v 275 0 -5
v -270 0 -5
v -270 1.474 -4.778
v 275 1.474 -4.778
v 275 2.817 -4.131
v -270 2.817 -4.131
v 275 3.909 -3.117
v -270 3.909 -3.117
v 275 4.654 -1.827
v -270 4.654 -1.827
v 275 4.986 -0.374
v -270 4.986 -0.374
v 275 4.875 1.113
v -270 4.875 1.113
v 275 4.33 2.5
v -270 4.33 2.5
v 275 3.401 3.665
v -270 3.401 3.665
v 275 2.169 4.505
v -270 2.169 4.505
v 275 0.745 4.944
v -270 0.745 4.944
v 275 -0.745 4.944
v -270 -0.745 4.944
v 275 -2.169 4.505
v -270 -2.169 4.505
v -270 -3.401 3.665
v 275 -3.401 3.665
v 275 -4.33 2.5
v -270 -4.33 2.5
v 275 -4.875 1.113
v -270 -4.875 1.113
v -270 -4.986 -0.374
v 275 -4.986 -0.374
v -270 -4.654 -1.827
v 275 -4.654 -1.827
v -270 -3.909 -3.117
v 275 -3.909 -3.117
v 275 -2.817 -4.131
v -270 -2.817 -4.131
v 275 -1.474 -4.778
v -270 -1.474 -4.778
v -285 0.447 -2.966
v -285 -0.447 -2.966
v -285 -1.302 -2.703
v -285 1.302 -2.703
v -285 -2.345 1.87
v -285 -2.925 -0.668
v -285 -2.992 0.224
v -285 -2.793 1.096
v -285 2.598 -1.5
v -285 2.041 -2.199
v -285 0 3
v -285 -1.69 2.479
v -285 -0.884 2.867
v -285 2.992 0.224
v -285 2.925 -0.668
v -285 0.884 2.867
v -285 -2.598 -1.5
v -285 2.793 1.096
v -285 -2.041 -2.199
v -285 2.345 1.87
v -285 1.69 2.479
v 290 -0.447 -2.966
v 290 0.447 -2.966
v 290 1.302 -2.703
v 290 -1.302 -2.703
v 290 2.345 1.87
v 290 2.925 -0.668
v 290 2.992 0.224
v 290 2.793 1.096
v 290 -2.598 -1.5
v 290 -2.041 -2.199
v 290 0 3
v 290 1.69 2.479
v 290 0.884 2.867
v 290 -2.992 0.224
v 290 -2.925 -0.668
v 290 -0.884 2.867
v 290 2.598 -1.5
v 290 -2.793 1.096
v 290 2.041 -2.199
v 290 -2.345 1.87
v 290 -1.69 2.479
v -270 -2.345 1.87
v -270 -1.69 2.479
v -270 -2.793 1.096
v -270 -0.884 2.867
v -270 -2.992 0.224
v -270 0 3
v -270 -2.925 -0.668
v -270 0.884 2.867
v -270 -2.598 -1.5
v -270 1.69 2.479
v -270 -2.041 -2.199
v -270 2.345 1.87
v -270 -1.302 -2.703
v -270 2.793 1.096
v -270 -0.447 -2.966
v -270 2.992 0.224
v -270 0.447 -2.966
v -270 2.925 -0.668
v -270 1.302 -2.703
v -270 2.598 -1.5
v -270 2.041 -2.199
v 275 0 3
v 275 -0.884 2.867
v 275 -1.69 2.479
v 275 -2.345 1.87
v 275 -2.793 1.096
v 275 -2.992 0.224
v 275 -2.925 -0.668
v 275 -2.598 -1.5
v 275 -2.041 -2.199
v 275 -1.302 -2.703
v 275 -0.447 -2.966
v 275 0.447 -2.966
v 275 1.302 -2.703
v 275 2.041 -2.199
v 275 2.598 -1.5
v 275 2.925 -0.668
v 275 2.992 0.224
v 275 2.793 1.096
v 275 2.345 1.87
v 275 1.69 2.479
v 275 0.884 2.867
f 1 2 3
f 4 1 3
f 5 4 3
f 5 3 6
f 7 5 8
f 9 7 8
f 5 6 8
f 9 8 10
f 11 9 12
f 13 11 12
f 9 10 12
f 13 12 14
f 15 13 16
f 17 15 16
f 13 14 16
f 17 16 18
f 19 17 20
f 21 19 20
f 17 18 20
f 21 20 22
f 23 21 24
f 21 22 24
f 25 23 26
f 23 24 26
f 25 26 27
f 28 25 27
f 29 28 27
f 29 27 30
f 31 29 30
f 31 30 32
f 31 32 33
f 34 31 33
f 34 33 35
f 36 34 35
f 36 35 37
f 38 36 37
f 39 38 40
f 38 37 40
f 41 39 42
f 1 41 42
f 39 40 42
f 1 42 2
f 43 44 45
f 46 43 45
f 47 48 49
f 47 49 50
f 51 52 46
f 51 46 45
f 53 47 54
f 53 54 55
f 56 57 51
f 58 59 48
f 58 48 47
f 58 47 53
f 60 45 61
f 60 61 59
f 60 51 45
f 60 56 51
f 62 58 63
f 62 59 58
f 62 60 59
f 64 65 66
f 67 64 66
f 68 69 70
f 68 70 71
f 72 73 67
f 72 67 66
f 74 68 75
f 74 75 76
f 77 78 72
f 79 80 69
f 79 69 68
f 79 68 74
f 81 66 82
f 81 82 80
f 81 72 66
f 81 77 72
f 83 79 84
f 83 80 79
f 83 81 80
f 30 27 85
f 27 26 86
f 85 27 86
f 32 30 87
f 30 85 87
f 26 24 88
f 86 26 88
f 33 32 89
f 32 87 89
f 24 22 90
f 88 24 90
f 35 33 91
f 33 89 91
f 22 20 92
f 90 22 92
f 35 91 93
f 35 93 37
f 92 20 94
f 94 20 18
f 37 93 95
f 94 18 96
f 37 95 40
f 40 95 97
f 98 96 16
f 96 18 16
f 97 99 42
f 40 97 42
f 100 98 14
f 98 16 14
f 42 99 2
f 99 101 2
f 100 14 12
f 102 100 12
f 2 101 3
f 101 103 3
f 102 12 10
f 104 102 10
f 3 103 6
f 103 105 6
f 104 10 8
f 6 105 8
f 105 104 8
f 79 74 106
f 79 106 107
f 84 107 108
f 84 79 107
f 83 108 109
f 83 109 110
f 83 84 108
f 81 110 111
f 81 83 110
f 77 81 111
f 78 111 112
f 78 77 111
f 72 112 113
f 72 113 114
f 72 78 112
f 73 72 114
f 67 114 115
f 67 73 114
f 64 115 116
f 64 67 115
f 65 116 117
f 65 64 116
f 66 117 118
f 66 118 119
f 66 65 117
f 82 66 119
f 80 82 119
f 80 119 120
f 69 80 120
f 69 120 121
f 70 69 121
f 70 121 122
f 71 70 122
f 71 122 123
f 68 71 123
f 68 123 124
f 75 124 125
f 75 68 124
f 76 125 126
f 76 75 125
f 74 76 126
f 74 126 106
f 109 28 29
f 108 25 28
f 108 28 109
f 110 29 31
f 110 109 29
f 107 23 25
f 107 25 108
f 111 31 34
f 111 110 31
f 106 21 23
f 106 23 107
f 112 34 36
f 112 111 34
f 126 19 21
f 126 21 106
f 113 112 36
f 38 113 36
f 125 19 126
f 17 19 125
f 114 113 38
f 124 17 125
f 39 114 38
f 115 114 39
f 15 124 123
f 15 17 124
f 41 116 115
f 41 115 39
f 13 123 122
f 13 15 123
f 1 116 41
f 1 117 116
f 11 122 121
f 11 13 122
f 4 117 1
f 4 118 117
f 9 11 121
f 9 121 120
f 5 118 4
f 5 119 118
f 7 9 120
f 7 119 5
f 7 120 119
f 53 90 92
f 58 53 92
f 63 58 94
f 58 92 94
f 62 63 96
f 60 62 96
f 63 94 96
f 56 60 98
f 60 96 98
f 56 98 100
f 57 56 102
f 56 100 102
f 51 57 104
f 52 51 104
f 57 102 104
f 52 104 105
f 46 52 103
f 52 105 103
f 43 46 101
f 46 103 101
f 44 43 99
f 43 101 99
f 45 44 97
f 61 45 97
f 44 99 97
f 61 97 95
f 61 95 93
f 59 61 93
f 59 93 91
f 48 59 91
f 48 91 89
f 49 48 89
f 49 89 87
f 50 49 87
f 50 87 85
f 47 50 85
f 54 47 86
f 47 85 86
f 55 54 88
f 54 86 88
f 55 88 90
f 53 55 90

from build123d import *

# Parameters (mm, degrees)
EXTRUDE_1_DEPTH      = 275
EXTRUDE_1_DEPTH_BACK = 270
SKETCH_1_R           = 5
SKETCH_2_R           = 3
EXTRUDE_2_DEPTH      = 15
EXTRUDE_START        = 15
SKETCH_7_R           = 3
EXTRUDE_3_DEPTH      = 15


with BuildPart() as part:
    # Эскиз1 → Бобышка-Вытянуть1 (new, two sides: drawn at the far end of the back side and taken through both)
    with BuildSketch(Plane(origin=(0, 0, 0), x_dir=(0, 0, -1), z_dir=(1, 0, 0)).offset(-EXTRUDE_1_DEPTH_BACK)):
        Circle(SKETCH_1_R)
    extrude(amount=EXTRUDE_1_DEPTH + EXTRUDE_1_DEPTH_BACK)

    # Эскиз2 → Бобышка-Вытянуть2 (add)
    with BuildSketch(Plane.ZY.offset(270)):
        Circle(SKETCH_2_R)
    extrude(amount=EXTRUDE_2_DEPTH)

    # Эскиз7 → Бобышка-Вытянуть3 (add)
    with BuildSketch(Plane(origin=(275, 0, 0), x_dir=(0, 0, -1), z_dir=(1, 0, 0)).offset(EXTRUDE_START)):
        with Locations(Location((0, 0, 0), (0, 0, 180))):
            Circle(SKETCH_7_R)
    extrude(amount=-EXTRUDE_3_DEPTH)


solid = part.part
